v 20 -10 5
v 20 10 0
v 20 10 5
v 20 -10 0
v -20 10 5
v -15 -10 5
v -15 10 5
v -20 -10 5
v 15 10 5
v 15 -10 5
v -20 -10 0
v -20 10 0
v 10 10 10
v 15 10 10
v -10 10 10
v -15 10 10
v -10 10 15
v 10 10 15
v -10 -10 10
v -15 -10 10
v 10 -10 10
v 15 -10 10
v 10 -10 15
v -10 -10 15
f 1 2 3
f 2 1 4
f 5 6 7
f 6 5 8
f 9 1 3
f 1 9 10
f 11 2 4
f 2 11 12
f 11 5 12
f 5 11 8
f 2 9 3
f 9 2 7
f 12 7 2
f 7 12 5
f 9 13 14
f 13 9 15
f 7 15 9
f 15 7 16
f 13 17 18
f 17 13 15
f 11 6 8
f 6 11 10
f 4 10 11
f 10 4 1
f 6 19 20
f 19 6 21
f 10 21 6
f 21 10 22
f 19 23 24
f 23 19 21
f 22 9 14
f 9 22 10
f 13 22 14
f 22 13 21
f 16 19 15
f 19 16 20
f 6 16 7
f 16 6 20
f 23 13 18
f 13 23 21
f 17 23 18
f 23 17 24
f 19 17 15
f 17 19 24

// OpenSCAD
// Generated with SolidPython2 for OpenSCAD task-019
$fn = 64;

union() {
	translate(v = [-20.0, -10.0, 0]) {
		cube(size = [40, 20, 5]);
	}
	translate(v = [-15.0, -10.0, 5]) {
		cube(size = [30, 20, 5]);
	}
	translate(v = [-10.0, -10.0, 10]) {
		cube(size = [20, 20, 5]);
	}
}
